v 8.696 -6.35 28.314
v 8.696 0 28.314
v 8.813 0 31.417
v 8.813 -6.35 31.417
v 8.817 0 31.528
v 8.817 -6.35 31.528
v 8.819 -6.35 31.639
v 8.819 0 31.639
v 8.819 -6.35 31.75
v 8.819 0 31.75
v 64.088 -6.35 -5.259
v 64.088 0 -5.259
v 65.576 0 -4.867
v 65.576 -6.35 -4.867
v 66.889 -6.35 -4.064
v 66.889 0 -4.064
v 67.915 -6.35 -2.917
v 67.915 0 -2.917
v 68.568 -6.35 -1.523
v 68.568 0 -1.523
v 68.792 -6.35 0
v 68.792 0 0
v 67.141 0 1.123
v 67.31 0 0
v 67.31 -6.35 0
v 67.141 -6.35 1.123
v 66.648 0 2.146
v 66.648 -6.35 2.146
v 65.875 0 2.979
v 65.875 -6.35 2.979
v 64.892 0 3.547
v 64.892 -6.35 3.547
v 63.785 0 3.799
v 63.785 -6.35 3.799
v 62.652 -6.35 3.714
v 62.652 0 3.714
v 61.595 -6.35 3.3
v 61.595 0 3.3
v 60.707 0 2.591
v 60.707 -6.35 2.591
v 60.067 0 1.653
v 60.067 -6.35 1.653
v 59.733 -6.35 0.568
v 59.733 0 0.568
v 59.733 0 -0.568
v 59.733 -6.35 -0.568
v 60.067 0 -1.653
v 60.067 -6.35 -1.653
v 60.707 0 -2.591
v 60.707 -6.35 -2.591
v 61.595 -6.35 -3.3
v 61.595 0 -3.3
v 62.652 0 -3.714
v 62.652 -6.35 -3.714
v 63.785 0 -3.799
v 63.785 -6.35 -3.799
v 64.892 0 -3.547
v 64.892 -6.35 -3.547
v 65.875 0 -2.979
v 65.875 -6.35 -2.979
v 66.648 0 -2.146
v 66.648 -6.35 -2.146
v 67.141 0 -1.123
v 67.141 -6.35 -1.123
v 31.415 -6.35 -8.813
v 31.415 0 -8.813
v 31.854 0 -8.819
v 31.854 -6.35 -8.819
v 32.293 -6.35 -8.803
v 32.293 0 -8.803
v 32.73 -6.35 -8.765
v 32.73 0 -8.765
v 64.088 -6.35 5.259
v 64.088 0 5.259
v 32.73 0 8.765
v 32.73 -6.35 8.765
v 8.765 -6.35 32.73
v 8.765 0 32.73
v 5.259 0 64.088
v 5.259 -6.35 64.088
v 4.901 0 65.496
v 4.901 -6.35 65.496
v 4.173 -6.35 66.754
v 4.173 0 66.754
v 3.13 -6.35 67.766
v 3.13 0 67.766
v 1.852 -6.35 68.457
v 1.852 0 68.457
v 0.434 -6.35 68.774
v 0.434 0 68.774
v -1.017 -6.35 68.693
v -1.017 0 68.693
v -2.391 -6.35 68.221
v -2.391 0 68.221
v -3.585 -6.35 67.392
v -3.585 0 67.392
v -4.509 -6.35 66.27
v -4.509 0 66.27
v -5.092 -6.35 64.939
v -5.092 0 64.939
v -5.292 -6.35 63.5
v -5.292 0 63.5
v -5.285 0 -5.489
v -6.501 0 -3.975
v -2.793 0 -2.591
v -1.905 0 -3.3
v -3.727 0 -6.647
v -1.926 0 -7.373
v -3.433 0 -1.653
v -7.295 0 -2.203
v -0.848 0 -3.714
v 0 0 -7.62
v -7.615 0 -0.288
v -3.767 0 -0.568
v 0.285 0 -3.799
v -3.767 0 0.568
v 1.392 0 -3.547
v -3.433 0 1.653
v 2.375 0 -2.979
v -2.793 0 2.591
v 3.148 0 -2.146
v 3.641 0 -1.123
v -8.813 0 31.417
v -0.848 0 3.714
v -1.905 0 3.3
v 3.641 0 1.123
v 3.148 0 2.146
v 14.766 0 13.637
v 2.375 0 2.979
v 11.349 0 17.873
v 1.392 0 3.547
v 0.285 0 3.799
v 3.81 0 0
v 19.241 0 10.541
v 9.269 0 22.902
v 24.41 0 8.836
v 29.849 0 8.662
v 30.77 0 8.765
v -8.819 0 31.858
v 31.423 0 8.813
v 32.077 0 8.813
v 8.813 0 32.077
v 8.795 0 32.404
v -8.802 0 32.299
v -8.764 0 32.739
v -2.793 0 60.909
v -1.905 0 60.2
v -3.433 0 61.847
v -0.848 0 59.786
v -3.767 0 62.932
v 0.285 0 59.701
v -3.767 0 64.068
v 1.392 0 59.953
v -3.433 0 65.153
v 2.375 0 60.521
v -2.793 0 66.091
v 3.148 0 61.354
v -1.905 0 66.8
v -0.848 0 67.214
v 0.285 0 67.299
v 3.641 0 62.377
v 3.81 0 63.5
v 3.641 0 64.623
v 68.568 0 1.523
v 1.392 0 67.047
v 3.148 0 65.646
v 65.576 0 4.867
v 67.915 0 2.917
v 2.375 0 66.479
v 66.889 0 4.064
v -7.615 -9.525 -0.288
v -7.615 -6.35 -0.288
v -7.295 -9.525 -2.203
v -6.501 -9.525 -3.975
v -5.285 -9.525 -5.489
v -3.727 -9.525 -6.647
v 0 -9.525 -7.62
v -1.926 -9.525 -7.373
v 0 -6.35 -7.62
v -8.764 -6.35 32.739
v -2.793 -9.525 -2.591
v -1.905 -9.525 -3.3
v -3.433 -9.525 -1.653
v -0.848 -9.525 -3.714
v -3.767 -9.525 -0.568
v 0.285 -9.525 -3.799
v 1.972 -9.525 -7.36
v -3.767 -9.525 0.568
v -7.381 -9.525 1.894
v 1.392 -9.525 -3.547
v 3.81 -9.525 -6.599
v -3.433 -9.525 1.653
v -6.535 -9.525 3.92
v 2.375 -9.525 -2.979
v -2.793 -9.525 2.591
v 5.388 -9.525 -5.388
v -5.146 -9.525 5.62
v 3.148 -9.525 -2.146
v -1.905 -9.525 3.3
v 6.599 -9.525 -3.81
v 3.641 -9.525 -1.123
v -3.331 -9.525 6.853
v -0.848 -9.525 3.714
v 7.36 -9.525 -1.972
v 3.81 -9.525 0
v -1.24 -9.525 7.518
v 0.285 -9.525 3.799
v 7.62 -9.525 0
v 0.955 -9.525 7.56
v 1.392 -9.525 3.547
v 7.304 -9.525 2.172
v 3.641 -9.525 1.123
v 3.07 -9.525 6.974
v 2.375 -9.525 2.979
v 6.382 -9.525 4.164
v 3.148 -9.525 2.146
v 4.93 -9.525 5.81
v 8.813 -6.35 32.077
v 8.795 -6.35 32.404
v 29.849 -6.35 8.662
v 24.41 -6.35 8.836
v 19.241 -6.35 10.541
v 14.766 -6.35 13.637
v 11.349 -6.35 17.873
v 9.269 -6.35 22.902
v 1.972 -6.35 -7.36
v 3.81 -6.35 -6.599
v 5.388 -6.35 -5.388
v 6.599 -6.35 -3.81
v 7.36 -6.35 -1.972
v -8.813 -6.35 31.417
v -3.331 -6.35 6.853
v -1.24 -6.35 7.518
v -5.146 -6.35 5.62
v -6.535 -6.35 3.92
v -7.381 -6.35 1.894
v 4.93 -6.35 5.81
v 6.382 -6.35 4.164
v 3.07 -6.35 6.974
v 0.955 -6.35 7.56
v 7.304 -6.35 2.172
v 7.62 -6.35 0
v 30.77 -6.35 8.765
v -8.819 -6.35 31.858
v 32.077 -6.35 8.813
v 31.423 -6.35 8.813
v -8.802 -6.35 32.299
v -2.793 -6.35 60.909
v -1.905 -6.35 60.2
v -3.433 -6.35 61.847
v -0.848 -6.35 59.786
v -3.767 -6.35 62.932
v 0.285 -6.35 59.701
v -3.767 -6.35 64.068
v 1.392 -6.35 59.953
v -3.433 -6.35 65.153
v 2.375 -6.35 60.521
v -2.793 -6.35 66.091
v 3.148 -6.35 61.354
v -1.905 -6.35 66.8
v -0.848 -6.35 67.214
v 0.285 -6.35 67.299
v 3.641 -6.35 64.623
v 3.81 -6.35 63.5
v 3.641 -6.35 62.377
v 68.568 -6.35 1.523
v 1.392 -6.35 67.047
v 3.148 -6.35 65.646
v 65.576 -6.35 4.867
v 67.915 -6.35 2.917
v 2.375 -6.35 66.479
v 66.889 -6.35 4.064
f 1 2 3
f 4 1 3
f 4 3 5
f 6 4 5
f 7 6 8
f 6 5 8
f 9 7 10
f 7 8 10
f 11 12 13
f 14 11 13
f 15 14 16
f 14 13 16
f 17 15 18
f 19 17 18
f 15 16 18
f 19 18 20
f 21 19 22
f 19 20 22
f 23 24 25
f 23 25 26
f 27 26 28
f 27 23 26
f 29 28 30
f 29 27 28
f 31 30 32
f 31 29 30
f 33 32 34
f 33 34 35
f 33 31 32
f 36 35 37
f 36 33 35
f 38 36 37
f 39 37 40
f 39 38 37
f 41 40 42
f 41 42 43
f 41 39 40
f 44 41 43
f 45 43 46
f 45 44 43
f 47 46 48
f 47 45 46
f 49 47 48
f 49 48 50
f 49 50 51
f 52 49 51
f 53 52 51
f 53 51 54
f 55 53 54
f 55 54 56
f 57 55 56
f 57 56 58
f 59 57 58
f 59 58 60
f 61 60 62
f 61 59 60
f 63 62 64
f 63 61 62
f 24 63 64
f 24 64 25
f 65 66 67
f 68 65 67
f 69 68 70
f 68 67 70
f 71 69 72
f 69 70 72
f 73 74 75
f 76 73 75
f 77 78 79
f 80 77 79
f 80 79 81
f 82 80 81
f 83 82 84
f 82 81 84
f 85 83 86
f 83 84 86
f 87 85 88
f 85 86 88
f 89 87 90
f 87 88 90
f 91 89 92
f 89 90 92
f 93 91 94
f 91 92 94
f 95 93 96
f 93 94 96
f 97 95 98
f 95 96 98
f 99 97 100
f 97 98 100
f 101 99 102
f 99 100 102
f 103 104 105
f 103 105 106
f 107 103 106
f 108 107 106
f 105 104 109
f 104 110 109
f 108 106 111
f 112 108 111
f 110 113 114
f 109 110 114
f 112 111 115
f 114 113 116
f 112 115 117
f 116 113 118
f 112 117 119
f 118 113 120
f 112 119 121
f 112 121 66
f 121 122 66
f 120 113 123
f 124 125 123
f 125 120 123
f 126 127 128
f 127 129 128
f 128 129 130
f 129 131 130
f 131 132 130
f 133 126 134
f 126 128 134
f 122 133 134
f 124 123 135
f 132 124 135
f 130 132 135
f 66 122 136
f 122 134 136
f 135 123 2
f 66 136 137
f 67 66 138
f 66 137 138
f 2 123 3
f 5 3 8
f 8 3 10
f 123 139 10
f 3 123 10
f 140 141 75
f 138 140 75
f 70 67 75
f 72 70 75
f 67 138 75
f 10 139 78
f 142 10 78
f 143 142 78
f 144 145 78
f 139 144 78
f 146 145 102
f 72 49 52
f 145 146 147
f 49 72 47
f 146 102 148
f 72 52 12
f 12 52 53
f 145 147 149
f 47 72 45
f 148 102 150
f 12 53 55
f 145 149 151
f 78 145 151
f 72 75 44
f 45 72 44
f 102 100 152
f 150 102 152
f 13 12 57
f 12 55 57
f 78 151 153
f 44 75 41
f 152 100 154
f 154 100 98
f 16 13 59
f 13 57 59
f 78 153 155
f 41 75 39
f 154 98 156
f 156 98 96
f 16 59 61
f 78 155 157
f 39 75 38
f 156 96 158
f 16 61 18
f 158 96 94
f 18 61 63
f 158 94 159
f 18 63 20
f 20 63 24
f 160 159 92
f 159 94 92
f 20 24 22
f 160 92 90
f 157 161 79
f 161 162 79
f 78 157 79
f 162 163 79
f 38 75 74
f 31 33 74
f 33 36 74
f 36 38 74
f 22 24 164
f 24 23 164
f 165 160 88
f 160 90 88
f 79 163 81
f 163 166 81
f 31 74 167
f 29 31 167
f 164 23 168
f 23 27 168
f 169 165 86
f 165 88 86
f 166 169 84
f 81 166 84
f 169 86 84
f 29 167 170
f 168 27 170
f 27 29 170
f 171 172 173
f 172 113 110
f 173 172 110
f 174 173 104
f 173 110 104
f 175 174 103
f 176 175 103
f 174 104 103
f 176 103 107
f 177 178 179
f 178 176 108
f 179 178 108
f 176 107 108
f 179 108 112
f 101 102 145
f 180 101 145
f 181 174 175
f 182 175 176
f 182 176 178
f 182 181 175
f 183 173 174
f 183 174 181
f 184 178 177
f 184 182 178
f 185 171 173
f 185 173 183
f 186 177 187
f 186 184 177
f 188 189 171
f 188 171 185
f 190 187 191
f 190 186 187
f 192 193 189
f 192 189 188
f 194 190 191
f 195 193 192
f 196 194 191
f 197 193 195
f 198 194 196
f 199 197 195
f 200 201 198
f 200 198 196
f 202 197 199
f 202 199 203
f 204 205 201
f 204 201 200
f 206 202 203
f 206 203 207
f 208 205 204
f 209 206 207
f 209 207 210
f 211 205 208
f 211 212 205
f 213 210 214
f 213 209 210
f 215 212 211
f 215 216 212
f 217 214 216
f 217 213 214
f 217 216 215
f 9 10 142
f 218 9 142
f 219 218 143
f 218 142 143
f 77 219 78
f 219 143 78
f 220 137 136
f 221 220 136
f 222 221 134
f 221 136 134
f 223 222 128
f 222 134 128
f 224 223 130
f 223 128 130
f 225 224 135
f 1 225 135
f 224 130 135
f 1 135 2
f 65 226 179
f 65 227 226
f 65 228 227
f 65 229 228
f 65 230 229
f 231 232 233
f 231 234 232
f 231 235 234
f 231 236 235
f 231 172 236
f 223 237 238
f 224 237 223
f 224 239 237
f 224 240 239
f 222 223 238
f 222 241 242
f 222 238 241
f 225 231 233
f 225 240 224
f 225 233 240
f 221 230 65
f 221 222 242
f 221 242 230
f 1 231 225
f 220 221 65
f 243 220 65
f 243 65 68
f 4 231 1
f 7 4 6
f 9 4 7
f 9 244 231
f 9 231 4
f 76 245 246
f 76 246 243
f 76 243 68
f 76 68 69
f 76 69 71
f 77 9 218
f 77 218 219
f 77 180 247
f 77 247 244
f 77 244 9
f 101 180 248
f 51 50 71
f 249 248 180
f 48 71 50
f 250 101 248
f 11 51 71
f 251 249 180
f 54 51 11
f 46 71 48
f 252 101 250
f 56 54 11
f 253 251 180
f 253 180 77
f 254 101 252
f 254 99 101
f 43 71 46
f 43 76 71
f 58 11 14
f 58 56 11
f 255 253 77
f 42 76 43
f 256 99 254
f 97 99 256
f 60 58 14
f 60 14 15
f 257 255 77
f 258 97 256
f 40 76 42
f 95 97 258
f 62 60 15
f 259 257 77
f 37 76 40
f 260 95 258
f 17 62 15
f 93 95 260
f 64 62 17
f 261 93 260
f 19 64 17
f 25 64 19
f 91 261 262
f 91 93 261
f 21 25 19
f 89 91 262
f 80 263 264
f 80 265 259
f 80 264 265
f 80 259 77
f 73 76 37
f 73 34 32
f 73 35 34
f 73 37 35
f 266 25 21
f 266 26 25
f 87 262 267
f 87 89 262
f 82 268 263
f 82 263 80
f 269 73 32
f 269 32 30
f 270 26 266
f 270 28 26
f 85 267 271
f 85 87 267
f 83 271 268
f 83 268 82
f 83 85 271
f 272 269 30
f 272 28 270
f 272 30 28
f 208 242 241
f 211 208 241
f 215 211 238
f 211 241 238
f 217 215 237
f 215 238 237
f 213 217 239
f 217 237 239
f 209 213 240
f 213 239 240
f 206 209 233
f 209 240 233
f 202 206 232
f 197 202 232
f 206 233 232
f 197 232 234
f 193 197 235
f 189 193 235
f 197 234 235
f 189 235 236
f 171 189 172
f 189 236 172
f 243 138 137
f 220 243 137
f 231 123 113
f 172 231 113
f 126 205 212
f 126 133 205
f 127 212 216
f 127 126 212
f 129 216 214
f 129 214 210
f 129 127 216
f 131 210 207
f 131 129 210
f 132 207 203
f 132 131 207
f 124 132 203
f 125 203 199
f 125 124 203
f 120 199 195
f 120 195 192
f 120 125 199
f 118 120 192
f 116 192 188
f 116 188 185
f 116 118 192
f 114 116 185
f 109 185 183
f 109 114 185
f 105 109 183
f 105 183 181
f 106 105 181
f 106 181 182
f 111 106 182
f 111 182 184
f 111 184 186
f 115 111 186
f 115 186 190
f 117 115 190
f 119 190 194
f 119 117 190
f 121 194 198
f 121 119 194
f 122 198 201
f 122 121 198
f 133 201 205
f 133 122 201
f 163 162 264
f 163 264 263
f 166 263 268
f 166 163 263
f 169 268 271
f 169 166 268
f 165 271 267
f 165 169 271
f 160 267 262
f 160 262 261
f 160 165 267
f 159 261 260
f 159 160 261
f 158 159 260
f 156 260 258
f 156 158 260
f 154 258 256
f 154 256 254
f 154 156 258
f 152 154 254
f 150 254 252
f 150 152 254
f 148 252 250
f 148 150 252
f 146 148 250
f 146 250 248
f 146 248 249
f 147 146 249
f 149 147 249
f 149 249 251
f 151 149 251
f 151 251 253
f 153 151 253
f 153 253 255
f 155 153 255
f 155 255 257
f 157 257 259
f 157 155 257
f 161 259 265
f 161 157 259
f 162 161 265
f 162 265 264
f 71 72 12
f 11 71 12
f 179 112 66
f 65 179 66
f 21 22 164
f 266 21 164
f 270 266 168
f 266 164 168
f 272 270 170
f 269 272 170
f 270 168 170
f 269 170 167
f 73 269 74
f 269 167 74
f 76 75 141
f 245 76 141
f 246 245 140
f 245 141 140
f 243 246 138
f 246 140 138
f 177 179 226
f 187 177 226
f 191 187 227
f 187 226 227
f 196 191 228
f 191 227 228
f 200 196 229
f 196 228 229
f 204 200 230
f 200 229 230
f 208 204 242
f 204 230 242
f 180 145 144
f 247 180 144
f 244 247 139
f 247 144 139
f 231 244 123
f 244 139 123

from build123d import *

# Parameters (mm, degrees)
F0_R     = 3.81
F1_DEPTH = 6.35
F2_R     = 3.81
F3_DEPTH = 3.175


# Not quite as in the source:
# - a feature names something its author has since deleted; it is built from what else it names


with BuildPart() as f1:
    # F0 (on Front) → F1 (new body)
    with BuildSketch(Plane.XZ):
        with BuildLine():
            ThreePointArc((64.087961787, 5.2589050049), (58.2083291, 0), (64.087961787, -5.2589050049))
            ThreePointArc((64.087961787, -5.2589050049), (67.4441780635, -3.5277812174), (68.7916709, 0))
            ThreePointArc((68.7916709, 0), (67.4441780635, 3.5277812174), (64.087961787, 5.2589050049))
        make_face()
        with Locations((63.5, 0)):
            Circle(F0_R, mode=Mode.SUBTRACT)
        with BuildLine():
            ThreePointArc((5.2589006137, 64.087962963), (5.2834688034, 63.794437625), (5.2916666667, 63.5))
            ThreePointArc((5.2916666667, 63.5), (0, 58.2083333333), (-5.2916666667, 63.5))
            Line((-5.2916666667, 63.5), (-8.7637923714, 32.7392136171))
            ThreePointArc((-8.7637923714, 32.7392136171), (0.0046668449, 40.5694432097), (8.7648343562, 32.7299382716))
            Line((8.7648343562, 32.7299382716), (5.2589006137, 64.087962963))
        make_face()
        with BuildLine():
            ThreePointArc((-5.2916666667, 63.5), (0, 58.2083333333), (5.2916666667, 63.5))
            ThreePointArc((5.2916666667, 63.5), (5.2834688034, 63.794437625), (5.2589006137, 64.087962963))
            ThreePointArc((5.2589006137, 64.087962963), (-0.294437625, 68.7834688034), (-5.2916666667, 63.5))
        make_face()
        with Locations((0, 63.5)):
            Circle(F0_R, mode=Mode.SUBTRACT)
        with BuildLine():
            ThreePointArc((8.8131488161, 31.4168209877), (0, 22.9305555556), (-8.8131488161, 31.4168209877))
            Line((-8.8131488161, 31.4168209877), (-7.6145605771, -0.2878666667))
            ThreePointArc((-7.6145605771, -0.2878666667), (-0.1439590264, 7.6186400229), (7.62, 0))
            ThreePointArc((7.62, 0), (5.3881536726, -5.3881536726), (0, -7.62))
            Line((0, -7.62), (31.4152979668, -8.8130854583))
            ThreePointArc((31.4152979668, -8.8130854583), (22.9364968819, -0.3235174392), (30.7700650994, 8.7648290535))
            Line((30.7700650994, 8.7648290535), (29.8488925204, 8.6618391202))
            ThreePointArc((29.8488925204, 8.6618391202), (14.7662444168, 13.637318243), (8.6958303376, 28.313548659))
            Line((8.6958303376, 28.313548659), (8.8131488161, 31.4168209877))
        make_face()
        with BuildLine():
            ThreePointArc((30.7700650994, 8.7648290535), (22.9364968819, -0.3235174392), (31.4152979668, -8.8130854583))
            ThreePointArc((31.4152979668, -8.8130854583), (32.0735174392, -8.8135031181), (32.7299349006, -8.7648290535))
            ThreePointArc((32.7299349006, -8.7648290535), (38.3236206398, -5.8796268956), (40.5694388, 0))
            ThreePointArc((40.5694388, 0), (38.3236206398, 5.8796268956), (32.7299349006, 8.7648290535))
            ThreePointArc((32.7299349006, 8.7648290535), (31.75, 8.8194388), (30.7700650994, 8.7648290535))
        make_face()
        with BuildLine():
            ThreePointArc((40.5694388, 0), (38.3236206398, -5.8796268956), (32.7299349006, -8.7648290535))
            Line((32.7299349006, -8.7648290535), (64.087961787, -5.2589050049))
            ThreePointArc((64.087961787, -5.2589050049), (58.2083291, 0), (64.087961787, 5.2589050049))
            Line((64.087961787, 5.2589050049), (32.7299349006, 8.7648290535))
            ThreePointArc((32.7299349006, 8.7648290535), (38.3236206398, 5.8796268956), (40.5694388, 0))
        make_face()
        with BuildLine():
            ThreePointArc((7.62, 0), (-0.1439590264, 7.6186400229), (-7.6145605771, -0.2878666667))
            ThreePointArc((-7.6145605771, -0.2878666667), (-5.2853976199, -5.4889864274), (0, -7.62))
            ThreePointArc((0, -7.62), (5.3881536726, -5.3881536726), (7.62, 0))
        make_face()
        Circle(F0_R, mode=Mode.SUBTRACT)
        with BuildLine():
            ThreePointArc((8.8194444444, 31.75), (8.8057813389, 32.240729375), (8.7648343562, 32.7299382716))
            ThreePointArc((8.7648343562, 32.7299382716), (0.0046668449, 40.5694432097), (-8.7637923714, 32.7392136171))
            ThreePointArc((-8.7637923714, 32.7392136171), (-8.8133078888, 32.0789443195), (-8.8131488161, 31.4168209877))
            ThreePointArc((-8.8131488161, 31.4168209877), (0, 22.9305555556), (8.8131488161, 31.4168209877))
            ThreePointArc((8.8131488161, 31.4168209877), (8.8178703969, 31.5833807565), (8.8194444444, 31.75))
        make_face()
    extrude(amount=F1_DEPTH)

    # F2 (on face) → F3 (join)
    with BuildSketch(Plane.XZ.offset(6.35)):
        with BuildLine():
            ThreePointArc((0, -7.62), (5.3881536726, -5.3881536726), (7.62, 0))
            ThreePointArc((7.62, 0), (-0.1439590264, 7.6186400229), (-7.6145605771, -0.2878666667))
            ThreePointArc((-7.6145605771, -0.2878666667), (-5.2853976199, -5.4889864274), (0, -7.62))
        make_face()
        Circle(F2_R, mode=Mode.SUBTRACT)
    extrude(amount=F3_DEPTH)


solid = f1.part
